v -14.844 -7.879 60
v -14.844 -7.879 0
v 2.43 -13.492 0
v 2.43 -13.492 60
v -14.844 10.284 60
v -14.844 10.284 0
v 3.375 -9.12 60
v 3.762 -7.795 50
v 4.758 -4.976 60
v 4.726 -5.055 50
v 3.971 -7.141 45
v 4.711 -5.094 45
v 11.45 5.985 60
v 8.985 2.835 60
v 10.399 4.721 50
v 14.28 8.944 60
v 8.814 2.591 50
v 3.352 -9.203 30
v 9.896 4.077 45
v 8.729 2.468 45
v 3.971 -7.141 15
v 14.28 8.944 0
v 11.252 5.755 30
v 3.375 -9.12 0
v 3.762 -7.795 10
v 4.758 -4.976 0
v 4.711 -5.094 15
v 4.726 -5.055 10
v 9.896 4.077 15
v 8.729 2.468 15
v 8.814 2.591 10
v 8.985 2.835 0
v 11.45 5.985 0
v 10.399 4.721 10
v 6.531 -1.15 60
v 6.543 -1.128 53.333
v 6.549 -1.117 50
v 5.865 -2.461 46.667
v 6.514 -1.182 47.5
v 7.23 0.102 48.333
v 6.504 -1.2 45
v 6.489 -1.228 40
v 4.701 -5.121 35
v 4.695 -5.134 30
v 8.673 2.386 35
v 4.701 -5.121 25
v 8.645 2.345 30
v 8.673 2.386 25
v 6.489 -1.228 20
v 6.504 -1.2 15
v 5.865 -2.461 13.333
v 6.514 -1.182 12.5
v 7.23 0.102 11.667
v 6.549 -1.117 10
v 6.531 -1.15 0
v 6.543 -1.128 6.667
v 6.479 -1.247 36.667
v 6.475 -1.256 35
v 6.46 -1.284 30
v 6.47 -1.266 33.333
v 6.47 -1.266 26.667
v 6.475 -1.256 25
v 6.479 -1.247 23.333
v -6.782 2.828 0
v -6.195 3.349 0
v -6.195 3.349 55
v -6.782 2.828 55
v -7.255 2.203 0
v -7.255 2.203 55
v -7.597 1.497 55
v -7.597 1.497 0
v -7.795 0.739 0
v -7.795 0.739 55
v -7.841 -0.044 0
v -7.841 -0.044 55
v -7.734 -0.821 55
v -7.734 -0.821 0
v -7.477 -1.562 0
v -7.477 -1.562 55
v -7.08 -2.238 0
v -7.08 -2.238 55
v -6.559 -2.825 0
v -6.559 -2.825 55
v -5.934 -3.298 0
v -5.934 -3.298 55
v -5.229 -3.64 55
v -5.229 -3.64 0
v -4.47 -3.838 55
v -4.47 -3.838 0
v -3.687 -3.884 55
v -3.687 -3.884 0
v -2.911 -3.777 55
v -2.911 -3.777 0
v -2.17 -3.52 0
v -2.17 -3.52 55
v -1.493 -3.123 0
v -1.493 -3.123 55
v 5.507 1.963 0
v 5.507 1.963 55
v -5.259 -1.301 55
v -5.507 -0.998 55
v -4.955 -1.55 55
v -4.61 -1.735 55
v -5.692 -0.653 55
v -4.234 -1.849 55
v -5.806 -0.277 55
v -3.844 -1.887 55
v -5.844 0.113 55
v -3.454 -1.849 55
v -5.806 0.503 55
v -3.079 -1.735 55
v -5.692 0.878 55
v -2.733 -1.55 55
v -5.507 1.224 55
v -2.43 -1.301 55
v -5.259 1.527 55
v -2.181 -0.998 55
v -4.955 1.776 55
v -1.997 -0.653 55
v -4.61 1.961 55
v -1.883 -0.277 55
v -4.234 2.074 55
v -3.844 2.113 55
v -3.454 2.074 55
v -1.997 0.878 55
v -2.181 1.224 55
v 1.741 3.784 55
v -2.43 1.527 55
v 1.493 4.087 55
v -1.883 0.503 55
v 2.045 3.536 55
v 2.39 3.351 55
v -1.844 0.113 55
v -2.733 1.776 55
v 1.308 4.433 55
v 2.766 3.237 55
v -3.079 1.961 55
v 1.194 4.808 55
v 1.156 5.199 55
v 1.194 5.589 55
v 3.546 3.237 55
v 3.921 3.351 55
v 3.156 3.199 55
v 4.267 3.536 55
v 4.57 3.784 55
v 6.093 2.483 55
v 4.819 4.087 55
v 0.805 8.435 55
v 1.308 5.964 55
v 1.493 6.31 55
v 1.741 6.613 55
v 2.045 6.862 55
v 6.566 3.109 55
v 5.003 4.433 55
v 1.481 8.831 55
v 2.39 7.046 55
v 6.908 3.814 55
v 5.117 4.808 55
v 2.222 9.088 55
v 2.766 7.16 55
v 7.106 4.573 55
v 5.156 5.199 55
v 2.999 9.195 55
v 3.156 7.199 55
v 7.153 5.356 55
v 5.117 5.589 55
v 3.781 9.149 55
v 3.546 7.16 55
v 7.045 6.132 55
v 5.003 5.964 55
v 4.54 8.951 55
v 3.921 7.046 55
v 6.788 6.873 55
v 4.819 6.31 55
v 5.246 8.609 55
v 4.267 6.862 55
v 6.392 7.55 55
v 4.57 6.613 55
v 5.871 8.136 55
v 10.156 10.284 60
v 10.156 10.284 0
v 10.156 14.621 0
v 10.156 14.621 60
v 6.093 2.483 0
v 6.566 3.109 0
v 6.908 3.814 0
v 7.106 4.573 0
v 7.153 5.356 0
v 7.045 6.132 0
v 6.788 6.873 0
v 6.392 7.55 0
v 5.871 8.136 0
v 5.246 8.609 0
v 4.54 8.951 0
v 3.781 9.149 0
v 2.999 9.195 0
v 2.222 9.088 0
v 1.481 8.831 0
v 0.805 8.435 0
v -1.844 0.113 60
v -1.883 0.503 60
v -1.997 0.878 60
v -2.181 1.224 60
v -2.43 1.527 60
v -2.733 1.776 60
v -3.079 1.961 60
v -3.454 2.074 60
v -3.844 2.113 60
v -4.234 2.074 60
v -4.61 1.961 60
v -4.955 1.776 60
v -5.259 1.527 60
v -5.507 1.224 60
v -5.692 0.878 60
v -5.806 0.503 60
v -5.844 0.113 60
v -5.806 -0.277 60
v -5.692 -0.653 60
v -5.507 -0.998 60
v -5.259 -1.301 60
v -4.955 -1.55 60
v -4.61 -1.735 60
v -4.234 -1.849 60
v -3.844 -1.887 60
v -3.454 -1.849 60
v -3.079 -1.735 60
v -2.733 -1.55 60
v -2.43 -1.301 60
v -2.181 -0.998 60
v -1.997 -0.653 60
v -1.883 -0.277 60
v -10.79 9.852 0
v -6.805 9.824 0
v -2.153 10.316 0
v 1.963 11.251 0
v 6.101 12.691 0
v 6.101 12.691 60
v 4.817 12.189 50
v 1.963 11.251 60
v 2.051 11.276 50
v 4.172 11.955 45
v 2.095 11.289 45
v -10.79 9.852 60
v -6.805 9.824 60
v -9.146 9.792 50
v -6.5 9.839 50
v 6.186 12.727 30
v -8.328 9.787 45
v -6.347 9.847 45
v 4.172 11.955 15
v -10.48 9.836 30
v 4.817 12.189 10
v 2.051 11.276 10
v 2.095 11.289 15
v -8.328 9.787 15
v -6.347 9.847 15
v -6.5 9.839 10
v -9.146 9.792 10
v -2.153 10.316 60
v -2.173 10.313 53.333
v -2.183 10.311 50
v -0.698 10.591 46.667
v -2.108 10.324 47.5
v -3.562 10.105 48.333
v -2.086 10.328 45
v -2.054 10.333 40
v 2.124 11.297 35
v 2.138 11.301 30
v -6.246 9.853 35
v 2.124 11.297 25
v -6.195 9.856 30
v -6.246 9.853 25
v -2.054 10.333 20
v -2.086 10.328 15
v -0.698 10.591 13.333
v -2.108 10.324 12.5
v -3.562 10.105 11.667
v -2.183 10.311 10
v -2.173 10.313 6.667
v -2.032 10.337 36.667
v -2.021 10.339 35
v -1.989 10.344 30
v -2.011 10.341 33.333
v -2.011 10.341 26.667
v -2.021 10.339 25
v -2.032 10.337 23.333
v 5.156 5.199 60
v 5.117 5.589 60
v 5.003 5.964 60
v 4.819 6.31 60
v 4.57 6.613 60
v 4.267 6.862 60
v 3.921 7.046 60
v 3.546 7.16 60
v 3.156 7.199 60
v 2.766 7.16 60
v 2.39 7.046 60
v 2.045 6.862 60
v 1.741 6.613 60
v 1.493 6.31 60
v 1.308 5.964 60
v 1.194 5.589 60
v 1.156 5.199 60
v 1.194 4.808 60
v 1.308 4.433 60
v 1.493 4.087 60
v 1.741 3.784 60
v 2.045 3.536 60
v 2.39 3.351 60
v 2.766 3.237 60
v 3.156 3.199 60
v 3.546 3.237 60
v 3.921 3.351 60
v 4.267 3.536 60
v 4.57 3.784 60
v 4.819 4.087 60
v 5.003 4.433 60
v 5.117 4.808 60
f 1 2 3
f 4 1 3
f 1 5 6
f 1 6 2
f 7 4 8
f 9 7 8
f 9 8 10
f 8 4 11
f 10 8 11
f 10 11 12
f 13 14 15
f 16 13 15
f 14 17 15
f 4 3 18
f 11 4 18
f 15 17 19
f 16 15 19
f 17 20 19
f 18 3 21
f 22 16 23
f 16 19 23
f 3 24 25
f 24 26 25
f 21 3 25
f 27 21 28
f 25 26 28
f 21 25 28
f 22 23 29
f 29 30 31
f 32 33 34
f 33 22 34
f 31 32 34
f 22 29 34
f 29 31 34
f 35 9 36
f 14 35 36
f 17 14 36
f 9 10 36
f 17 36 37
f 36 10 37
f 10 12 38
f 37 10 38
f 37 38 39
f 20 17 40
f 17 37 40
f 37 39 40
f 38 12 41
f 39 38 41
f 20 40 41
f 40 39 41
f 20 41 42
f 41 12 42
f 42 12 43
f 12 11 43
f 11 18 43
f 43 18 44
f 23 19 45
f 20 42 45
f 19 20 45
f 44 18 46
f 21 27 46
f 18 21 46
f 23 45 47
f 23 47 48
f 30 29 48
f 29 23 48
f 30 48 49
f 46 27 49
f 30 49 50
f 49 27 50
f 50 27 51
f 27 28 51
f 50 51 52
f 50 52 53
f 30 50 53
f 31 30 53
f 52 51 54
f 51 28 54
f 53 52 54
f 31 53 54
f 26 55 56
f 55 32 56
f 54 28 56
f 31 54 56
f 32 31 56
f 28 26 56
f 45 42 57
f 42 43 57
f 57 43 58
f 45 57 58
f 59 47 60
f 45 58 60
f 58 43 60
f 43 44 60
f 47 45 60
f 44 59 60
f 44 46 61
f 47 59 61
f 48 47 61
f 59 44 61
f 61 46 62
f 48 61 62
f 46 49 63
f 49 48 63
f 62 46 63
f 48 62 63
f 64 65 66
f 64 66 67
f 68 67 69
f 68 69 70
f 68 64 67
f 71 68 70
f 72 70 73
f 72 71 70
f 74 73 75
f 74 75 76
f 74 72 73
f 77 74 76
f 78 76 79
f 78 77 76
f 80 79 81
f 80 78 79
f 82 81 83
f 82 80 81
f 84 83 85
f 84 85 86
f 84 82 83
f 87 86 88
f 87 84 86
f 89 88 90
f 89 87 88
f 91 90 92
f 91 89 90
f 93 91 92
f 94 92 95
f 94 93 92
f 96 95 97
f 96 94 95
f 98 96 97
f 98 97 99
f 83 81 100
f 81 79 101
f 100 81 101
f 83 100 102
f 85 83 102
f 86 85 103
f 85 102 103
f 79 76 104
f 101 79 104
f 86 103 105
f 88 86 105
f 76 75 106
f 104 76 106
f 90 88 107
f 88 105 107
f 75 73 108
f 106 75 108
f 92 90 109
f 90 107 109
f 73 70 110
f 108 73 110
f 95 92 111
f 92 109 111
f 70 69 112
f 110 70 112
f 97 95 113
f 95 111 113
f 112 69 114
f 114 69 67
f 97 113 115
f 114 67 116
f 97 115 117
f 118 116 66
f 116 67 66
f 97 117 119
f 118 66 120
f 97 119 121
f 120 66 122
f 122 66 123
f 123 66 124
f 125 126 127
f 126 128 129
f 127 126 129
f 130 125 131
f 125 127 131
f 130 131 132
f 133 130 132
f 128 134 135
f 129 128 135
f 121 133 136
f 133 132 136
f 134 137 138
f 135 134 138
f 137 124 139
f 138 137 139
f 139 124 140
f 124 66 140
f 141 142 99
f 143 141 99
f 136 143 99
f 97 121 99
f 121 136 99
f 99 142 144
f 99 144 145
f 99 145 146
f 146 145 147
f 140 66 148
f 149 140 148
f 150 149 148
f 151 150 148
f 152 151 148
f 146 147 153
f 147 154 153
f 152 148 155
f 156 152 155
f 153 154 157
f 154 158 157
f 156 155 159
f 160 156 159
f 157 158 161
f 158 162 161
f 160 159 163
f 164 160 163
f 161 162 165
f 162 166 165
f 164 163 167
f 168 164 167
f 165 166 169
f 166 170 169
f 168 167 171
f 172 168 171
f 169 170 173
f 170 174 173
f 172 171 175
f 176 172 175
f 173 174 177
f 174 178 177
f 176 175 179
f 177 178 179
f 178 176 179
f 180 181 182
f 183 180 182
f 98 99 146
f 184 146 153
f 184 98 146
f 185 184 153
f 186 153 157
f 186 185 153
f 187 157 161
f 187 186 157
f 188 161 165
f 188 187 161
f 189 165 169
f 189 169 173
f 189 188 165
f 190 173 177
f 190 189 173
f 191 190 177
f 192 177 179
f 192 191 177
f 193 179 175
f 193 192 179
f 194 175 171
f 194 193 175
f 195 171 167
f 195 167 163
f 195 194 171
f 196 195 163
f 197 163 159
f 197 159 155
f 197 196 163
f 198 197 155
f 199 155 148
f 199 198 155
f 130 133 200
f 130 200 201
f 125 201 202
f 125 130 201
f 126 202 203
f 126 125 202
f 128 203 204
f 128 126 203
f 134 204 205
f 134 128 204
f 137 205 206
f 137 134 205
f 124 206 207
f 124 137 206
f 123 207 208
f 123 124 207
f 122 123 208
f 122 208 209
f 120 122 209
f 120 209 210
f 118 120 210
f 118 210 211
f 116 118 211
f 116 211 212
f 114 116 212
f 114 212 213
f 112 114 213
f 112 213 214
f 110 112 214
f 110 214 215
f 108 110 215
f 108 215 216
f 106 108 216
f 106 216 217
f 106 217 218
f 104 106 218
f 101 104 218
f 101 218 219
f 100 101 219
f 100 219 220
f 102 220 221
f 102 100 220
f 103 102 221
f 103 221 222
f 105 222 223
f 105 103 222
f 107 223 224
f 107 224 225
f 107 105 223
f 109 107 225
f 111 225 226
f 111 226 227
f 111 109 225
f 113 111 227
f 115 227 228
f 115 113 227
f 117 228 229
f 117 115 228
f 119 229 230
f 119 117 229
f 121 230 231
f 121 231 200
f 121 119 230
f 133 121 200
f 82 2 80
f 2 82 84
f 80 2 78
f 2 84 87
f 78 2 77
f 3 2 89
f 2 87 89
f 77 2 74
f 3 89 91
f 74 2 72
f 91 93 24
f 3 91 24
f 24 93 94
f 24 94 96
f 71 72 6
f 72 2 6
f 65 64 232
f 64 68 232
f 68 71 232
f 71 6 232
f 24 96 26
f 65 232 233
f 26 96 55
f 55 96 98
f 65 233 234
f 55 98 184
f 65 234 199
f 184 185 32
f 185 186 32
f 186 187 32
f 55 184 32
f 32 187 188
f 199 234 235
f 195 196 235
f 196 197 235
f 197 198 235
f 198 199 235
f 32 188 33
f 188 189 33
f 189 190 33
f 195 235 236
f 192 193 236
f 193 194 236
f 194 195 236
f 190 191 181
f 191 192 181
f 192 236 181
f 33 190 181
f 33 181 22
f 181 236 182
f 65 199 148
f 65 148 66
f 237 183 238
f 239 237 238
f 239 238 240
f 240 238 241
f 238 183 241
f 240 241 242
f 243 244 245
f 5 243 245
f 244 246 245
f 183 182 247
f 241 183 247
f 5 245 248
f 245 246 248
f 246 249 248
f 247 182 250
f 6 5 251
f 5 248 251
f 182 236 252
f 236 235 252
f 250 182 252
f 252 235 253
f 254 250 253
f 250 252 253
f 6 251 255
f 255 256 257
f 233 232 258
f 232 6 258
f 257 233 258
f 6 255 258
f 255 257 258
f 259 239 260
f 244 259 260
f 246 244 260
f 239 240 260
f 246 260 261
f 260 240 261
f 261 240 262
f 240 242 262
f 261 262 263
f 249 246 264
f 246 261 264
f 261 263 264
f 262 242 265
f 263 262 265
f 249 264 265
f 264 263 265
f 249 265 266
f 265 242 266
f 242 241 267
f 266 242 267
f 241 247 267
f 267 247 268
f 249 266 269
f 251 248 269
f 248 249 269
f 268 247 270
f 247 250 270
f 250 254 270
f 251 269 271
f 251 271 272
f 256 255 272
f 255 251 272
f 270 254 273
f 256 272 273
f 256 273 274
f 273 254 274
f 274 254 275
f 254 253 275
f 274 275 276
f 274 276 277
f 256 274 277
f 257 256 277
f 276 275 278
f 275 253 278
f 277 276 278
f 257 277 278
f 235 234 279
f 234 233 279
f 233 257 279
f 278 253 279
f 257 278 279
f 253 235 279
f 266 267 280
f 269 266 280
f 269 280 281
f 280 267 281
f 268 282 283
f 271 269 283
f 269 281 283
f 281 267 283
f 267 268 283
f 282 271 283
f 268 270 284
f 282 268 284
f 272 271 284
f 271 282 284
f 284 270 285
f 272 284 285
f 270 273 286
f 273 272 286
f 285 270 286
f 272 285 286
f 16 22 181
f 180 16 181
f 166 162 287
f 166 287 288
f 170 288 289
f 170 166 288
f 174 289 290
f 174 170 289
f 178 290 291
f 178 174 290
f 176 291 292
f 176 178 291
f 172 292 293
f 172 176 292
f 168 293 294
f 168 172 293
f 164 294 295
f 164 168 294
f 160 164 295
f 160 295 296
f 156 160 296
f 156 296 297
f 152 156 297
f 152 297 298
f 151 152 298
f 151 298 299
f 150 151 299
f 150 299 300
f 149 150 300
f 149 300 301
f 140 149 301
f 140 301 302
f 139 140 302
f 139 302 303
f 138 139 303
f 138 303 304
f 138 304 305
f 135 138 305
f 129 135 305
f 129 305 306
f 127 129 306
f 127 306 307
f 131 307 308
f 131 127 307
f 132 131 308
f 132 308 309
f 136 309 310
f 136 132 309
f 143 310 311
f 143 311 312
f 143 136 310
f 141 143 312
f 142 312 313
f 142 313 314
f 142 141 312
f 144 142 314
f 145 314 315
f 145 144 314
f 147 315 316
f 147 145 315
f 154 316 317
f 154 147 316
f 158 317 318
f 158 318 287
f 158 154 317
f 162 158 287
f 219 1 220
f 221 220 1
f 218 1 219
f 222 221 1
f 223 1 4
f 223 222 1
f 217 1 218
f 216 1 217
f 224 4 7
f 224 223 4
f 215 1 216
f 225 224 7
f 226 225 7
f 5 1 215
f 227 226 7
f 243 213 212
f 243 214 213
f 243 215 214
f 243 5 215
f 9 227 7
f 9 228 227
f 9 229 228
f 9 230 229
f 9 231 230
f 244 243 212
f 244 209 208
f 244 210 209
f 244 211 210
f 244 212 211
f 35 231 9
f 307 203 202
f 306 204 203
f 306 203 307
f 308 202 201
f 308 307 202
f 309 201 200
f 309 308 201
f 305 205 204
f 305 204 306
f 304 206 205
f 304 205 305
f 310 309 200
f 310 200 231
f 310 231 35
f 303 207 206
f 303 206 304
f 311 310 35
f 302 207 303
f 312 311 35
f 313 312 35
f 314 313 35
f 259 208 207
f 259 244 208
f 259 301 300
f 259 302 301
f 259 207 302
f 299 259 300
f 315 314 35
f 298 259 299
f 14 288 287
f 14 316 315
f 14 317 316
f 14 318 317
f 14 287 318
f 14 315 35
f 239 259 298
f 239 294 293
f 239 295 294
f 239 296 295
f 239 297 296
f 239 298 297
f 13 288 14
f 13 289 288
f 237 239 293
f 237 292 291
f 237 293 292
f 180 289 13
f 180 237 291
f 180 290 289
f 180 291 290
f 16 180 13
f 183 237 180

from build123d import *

# Parameters (mm, degrees)
SKETCH_1_R          = 2
EXTRUDE_1_DEPTH     = 60
CUT_EXTRUDE_1_DEPTH = 55


with BuildPart() as part:
    # 草图1 → 凸台-拉伸1 (new body)
    with BuildSketch(Plane.XY):
        with BuildLine():
            Line((10.155709238, 10.284373102), (10.155709238, 14.620809902))
            add(Edge.make_bspline(
                [(10.155709238, 14.620809902), (-1.633651532, 8.235919316), (-14.844290763, 10.284373103)],
                knots=[0, 0, 0, 1, 1, 1], degree=2))
            Line((-14.844290763, 10.284373103), (-14.844290762, -7.879190098))
            Line((-14.844290762, -7.879190098), (2.430284378, -13.492039805))
            add(Edge.make_bspline(
                [(2.430284378, -13.492039805), (4.564401085, -0.294968248), (14.279905714, 8.944340437)],
                knots=[0, 0, 0, 1, 1, 1], degree=2))
            Line((14.279905714, 8.944340437), (10.155709238, 10.284373102))
        make_face()
        with Locations((-3.844290762, 0.11277771)):
            Circle(SKETCH_1_R, mode=Mode.SUBTRACT)
        with Locations((3.155709238, 5.198575406)):
            Circle(SKETCH_1_R, mode=Mode.SUBTRACT)
    extrude(amount=EXTRUDE_1_DEPTH)

    # 草图2 → 切除-拉伸1 (cut)
    with BuildSketch(Plane(origin=(0, 0, 0), x_dir=(-1, 0, 0), z_dir=(0, 0, -1))):
        with BuildLine():
            Line((-0.804568229, 8.434643384), (6.195431771, 3.348845688))
            ThreePointArc((6.195431771, 3.348845688), (7.08035874, -2.238363299), (1.493149753, -3.123290267))
            Line((1.493149753, -3.123290267), (-5.506850247, 1.962507429))
            ThreePointArc((-5.506850247, 1.962507429), (-6.391777215, 7.549716416), (-0.804568229, 8.434643384))
        make_face()
    extrude(amount=-CUT_EXTRUDE_1_DEPTH, mode=Mode.SUBTRACT)


solid = part.part
